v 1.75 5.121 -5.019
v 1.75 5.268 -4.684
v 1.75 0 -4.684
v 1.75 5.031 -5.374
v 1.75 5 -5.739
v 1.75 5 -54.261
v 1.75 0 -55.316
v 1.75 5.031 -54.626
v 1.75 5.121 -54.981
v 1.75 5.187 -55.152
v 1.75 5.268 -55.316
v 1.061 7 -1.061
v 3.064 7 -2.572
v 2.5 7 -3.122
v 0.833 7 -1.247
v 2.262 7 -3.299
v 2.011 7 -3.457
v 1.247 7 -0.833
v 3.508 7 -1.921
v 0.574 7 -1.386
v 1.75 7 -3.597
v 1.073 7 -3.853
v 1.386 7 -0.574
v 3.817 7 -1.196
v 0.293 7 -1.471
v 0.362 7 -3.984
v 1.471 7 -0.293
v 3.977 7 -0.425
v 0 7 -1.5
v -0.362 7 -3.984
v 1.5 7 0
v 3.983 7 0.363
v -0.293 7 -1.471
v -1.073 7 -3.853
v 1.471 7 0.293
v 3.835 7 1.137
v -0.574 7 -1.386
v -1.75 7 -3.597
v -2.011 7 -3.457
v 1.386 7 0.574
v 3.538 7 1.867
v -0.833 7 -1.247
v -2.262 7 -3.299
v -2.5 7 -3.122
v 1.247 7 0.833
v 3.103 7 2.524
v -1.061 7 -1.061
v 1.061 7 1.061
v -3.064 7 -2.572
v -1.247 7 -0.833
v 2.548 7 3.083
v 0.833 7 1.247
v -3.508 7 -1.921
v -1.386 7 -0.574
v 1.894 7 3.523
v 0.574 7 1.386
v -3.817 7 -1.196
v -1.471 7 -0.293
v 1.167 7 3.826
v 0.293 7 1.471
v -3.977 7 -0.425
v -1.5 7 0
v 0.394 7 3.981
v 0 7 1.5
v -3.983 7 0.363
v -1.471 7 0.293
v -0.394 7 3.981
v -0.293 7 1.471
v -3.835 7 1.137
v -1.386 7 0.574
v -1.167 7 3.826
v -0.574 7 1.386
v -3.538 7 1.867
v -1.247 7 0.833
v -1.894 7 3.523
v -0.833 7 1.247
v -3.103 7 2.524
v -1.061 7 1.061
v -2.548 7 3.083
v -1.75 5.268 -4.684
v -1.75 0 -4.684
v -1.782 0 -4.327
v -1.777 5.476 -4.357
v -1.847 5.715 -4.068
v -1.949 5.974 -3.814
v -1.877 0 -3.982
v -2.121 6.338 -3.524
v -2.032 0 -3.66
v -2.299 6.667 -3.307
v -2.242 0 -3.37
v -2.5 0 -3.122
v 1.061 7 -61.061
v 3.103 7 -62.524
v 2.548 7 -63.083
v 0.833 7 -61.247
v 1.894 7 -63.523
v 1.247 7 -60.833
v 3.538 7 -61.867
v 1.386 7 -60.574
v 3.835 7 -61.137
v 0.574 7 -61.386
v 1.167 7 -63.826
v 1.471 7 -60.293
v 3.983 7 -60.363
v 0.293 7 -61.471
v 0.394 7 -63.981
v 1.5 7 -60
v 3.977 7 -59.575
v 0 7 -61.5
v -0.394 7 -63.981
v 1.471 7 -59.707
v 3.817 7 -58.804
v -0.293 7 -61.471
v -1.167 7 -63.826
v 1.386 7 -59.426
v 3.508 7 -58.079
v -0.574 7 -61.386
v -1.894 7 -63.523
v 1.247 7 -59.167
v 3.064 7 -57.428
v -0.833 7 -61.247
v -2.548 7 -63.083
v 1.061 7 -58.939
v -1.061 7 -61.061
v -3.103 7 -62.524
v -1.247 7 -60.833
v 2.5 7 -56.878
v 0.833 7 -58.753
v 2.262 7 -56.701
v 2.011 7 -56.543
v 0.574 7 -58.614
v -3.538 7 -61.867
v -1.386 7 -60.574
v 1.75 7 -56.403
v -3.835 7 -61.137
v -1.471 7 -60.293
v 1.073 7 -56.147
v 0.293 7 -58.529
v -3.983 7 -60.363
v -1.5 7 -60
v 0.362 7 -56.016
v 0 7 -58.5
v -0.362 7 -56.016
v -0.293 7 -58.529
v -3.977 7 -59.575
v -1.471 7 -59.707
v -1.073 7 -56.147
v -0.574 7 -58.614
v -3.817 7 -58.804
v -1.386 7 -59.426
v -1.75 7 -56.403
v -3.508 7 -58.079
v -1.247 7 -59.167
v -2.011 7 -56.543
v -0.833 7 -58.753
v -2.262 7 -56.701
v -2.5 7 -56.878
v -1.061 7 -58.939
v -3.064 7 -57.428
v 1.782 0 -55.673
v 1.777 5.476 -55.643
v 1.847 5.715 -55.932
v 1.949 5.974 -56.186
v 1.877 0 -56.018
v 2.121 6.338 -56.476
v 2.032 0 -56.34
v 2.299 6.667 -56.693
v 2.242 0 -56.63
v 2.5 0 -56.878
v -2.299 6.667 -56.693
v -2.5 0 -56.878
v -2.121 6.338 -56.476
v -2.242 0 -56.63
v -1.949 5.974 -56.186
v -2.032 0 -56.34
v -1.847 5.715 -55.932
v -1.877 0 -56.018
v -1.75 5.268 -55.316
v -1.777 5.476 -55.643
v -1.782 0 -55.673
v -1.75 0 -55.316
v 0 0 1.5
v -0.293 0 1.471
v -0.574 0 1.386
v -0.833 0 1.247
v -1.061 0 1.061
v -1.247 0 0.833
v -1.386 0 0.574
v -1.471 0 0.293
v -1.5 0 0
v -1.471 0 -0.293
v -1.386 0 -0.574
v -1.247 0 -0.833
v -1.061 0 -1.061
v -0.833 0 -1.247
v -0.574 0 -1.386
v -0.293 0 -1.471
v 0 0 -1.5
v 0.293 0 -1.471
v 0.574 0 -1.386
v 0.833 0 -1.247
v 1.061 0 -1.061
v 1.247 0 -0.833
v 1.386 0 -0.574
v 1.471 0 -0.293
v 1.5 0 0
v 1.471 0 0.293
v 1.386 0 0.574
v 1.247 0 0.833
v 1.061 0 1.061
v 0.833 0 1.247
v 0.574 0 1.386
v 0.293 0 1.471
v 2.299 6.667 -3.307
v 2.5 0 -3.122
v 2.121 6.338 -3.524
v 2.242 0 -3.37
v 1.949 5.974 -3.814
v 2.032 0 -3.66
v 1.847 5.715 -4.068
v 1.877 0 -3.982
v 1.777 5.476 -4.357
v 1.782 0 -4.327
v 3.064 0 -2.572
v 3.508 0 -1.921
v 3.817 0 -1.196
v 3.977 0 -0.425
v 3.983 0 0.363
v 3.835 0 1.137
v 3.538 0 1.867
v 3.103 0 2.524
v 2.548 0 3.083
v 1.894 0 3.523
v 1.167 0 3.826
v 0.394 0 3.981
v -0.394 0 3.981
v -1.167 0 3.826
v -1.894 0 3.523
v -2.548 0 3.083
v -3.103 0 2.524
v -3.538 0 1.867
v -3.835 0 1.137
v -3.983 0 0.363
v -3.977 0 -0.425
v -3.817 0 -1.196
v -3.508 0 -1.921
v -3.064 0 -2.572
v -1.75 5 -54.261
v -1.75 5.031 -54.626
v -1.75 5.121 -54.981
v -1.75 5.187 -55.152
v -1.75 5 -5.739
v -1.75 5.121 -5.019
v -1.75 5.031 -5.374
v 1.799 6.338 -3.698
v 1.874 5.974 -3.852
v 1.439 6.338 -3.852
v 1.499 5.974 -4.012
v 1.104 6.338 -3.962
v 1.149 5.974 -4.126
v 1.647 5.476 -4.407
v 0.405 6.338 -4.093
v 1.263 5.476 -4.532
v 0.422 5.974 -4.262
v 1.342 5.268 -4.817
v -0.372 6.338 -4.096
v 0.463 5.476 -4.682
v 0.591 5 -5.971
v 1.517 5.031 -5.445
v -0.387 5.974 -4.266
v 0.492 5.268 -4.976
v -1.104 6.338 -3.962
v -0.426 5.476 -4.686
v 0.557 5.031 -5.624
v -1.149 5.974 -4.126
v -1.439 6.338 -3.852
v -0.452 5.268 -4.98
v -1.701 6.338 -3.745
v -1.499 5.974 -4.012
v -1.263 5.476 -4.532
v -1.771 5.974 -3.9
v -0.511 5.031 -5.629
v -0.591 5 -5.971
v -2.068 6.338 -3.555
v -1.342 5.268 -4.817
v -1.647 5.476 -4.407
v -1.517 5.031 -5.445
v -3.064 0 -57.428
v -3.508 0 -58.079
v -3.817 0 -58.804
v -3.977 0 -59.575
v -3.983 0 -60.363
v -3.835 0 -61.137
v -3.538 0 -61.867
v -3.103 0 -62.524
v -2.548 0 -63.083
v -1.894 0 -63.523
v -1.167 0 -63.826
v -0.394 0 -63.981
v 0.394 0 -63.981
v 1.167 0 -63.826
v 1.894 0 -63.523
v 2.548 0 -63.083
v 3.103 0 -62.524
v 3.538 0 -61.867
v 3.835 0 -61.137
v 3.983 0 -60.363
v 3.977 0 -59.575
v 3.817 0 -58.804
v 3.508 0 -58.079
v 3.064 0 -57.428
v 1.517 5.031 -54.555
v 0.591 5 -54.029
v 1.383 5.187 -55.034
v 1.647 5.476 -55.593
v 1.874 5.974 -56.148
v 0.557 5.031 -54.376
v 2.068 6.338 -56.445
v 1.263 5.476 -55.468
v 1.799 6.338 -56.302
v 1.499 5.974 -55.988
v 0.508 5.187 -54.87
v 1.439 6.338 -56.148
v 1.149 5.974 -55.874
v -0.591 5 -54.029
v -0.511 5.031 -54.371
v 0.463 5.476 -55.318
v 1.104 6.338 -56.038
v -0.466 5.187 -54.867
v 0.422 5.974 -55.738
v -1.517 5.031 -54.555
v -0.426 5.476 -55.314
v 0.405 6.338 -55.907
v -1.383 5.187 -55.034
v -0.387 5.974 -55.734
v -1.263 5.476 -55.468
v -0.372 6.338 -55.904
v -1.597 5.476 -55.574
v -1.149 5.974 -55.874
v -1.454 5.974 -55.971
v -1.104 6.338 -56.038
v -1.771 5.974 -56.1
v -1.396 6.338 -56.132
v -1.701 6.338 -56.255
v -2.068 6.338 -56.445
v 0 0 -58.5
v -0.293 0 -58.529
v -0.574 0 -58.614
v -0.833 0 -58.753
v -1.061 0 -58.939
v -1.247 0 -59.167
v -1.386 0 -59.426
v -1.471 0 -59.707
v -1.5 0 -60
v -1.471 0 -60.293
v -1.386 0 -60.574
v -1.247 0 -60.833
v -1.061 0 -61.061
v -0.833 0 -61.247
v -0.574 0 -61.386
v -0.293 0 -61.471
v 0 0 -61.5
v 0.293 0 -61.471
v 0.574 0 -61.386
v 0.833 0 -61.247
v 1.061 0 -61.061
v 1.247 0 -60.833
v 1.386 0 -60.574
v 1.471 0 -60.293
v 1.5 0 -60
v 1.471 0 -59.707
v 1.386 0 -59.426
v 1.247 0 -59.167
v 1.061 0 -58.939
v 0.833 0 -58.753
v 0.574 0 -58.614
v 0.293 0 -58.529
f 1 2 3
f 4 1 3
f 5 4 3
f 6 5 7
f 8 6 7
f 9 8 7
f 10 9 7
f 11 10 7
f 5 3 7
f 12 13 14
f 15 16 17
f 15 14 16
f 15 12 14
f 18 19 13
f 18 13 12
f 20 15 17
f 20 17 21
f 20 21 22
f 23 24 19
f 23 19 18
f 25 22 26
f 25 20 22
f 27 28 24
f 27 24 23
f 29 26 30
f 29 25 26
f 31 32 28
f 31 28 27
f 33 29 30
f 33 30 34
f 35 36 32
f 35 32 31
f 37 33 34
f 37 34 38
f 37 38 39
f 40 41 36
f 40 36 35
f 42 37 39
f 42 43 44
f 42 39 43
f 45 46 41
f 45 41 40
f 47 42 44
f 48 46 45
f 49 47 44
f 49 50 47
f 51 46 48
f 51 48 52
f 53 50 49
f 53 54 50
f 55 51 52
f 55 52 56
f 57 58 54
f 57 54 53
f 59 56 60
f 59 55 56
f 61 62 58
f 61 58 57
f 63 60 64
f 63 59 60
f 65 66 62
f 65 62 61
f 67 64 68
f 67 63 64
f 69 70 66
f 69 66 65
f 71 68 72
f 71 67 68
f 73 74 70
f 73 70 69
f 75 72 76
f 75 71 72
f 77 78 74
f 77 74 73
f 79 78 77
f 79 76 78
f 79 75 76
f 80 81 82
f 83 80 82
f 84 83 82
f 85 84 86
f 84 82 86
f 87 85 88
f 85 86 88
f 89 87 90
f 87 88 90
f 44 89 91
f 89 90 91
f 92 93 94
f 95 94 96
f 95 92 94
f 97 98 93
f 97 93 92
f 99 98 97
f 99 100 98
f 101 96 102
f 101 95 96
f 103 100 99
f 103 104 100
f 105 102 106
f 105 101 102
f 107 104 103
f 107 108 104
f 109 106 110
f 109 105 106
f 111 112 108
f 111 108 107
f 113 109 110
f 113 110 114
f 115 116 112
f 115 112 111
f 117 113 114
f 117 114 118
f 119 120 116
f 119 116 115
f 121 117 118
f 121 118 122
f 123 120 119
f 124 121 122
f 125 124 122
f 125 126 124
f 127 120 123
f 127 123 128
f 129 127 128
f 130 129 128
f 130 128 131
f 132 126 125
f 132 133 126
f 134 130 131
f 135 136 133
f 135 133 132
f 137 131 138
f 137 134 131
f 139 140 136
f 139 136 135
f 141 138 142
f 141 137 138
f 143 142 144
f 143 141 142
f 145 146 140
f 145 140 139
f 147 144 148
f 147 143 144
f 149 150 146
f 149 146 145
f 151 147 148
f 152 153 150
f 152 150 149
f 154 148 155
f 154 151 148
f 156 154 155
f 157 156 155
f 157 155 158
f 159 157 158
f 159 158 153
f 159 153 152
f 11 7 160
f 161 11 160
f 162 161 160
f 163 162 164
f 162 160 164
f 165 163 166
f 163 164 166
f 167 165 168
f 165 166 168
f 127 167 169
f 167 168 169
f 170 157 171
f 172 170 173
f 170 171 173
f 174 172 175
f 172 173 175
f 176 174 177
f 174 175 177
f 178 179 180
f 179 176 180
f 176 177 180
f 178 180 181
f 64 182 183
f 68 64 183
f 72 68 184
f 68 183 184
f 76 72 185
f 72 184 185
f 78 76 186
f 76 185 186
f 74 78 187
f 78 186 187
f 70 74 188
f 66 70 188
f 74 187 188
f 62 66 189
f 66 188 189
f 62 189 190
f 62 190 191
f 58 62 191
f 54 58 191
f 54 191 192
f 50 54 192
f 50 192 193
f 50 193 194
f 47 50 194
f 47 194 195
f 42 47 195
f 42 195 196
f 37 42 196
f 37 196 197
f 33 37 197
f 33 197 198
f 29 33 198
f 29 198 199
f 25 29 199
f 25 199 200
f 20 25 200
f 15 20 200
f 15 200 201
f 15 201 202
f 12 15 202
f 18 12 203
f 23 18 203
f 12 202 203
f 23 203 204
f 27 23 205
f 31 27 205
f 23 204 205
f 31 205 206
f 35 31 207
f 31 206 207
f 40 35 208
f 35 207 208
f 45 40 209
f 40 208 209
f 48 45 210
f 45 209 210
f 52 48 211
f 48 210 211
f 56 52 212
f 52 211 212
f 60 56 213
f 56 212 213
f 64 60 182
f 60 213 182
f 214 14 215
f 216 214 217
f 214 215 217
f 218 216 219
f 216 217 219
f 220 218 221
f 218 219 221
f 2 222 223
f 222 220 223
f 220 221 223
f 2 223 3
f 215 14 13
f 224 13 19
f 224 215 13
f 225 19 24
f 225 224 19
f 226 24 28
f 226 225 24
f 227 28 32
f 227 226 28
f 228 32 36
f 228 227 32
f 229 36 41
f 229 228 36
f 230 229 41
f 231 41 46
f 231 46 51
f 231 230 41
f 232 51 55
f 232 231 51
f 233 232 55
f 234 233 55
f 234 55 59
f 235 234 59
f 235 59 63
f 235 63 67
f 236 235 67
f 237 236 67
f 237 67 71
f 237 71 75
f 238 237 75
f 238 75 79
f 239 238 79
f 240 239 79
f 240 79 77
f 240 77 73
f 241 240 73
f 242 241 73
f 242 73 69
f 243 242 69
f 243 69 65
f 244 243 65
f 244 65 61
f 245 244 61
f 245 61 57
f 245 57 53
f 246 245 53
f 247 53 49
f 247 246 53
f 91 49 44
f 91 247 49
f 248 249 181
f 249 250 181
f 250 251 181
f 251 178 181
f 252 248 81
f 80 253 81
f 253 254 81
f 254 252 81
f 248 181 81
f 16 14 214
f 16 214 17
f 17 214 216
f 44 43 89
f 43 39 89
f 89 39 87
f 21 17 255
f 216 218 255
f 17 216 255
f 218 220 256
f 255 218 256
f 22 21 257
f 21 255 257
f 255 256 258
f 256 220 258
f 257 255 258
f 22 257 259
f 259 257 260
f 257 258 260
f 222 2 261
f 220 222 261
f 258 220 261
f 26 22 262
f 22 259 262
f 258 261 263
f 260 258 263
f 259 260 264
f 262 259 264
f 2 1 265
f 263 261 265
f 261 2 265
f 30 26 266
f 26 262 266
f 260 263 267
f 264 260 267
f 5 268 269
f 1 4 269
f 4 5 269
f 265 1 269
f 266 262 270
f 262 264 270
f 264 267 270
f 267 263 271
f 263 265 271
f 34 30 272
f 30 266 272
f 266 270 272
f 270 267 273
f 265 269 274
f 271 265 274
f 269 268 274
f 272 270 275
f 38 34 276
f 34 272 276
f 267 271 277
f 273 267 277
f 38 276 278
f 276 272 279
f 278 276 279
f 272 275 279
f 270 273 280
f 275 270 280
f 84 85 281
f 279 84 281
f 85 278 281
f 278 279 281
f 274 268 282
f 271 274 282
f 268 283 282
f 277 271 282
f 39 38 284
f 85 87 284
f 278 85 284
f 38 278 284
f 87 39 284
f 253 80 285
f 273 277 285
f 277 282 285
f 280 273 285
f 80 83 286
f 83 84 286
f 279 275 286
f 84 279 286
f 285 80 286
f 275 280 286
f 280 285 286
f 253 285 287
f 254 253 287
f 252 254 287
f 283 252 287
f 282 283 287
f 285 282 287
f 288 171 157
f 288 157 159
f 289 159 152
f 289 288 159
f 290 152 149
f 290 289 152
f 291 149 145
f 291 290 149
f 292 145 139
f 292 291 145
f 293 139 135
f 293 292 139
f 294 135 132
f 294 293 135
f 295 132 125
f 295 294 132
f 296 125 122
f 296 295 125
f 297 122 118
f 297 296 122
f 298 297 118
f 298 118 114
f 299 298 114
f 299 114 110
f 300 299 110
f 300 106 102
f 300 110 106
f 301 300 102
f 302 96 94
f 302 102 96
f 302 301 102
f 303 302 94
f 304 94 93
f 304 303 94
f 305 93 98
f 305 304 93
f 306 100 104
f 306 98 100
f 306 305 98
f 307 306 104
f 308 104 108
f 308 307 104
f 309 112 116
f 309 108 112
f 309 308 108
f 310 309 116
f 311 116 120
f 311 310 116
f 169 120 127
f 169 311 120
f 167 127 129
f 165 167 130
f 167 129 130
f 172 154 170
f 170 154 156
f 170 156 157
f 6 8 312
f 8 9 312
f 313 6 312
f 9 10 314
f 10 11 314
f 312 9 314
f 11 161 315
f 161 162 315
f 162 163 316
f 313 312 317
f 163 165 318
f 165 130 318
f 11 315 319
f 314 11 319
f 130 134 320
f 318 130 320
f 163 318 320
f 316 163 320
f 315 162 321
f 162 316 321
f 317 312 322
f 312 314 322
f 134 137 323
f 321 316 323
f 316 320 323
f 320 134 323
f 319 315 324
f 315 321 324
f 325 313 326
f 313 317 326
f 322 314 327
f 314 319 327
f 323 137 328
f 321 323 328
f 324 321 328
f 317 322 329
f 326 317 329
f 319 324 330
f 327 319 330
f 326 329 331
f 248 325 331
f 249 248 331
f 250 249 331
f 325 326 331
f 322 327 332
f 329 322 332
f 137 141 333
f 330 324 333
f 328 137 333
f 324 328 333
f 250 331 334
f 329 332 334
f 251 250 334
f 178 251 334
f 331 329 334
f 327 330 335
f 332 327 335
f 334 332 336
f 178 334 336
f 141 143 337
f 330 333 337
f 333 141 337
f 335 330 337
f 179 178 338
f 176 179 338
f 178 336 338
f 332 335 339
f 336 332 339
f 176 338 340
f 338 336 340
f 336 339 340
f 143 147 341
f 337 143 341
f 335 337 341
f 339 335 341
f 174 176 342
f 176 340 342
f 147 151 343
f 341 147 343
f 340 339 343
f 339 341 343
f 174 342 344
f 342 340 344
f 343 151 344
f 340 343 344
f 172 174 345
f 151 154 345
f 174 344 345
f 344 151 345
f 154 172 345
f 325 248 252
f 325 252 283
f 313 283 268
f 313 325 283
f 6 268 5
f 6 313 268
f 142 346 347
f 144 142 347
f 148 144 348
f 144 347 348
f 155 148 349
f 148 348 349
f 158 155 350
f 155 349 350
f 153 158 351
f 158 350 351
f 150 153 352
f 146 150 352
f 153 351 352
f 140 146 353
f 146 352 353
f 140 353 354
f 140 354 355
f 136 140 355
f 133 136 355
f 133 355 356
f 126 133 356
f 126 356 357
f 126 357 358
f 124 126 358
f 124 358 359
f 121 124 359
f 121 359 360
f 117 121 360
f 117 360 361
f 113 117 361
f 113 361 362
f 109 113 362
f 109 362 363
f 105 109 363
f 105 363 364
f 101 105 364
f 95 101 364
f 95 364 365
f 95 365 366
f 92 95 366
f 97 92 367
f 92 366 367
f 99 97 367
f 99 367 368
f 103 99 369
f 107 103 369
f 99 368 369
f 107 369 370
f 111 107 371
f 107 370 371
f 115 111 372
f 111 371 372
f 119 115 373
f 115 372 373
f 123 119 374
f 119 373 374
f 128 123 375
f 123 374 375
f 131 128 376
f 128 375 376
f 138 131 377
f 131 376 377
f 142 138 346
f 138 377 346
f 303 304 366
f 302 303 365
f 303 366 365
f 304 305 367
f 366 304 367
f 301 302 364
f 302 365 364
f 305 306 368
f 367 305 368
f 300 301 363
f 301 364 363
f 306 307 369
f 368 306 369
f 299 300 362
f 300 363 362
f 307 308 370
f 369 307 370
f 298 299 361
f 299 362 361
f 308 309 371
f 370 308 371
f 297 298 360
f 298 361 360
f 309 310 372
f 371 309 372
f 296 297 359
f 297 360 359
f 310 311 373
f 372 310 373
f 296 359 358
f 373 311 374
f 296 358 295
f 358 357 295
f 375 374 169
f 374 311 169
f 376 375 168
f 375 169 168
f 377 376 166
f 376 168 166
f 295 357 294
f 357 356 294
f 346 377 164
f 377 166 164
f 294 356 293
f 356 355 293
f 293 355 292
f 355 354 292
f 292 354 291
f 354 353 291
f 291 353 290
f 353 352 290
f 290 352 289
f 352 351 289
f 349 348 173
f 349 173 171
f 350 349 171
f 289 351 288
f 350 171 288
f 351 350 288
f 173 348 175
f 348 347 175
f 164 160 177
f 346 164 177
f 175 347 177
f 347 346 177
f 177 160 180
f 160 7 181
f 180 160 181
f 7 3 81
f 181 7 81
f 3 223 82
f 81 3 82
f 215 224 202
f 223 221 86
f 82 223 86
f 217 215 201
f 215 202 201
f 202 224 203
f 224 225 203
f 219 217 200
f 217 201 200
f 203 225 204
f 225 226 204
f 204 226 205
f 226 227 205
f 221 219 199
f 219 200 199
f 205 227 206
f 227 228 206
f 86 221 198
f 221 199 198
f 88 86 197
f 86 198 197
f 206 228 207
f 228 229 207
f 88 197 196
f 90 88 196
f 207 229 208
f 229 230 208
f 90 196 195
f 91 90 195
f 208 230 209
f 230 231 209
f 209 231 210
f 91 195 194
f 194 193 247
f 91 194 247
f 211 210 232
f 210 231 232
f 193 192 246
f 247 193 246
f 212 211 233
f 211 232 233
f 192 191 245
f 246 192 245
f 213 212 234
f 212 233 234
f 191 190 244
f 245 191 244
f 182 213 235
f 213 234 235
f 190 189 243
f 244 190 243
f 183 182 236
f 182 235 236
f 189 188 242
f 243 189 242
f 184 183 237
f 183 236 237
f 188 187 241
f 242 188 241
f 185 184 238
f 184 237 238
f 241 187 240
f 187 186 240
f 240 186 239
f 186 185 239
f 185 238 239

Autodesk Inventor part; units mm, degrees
ref_plane "YZ Plane" through (0, 0, 0) normal (1, 0, 0) x (0, 1, 0)
ref_plane "XZ Plane" through (0, 0, 0) normal (0, 1, 0) x (-1, 0, 0)
ref_plane "XY Plane" through (0, 0, 0) normal (0, 0, 1) x (1, 0, 0)
sketch "Sketch1" plane through (0, 0, 0) normal (0, 1, 0) x (-1, 0, 0)
  circle A0 centre (0, 0) radius 4
  line L0 (0, 0) -> (0, -60)
  circle A1 centre (0, -60) radius 4
  line L1 (0, 0) -> (0, -60) construction
  line L2 (-1.75, 0) -> (-1.75, -60)
  line L3 (1.75, -60) -> (1.75, 0)
  arc A2 (1.75, 0) -> (-1.75, 0) centre (0, 0) ccw
  arc A3 (-1.75, -60) -> (1.75, -60) centre (0, -60) ccw
  point P0 (0, -30)
  point P1 (-1.75, -3.5969)
  point P2 (-1.75, -56.4031)
  point P3 (1.75, -56.4031)
  point P4 (1.75, -3.5969)
  dimension "d0" = 8
  dimension "d1" = 60
  dimension "d2" = 8
  dimension "d3" = 3.5
extrude "Extrusion1" add sketch "Sketch1" along normal blind 7
sketch "Sketch2" plane through (0, 7, 0) normal (0, 1, 0) x (1, 0, 0)
  line L0 (1.75, 3.5969) -> (1.75, 56.4031) projected
  arc A0 (1.75, 56.4031) -> (-1.75, 56.4031) centre (0, 60) ccw projected
  line L1 (-1.75, 56.4031) -> (-1.75, 3.5969) projected
  arc A1 (-1.75, 3.5969) -> (1.75, 3.5969) centre (0, 0) ccw projected
  circle A2 centre (0, 0) radius 4
  circle A3 centre (0, 60) radius 4
  point P0 (-1.75, 56.4031)
  point P1 (-1.75, 3.5969)
  dimension "d6" = 8
  dimension "d7" = 8
extrude "Extrusion2" cut sketch "Sketch2" against normal blind 2 contours A2 L1 A3 L0
sketch "Sketch3" plane through (0, 7, 0) normal (0, 1, 0) x (1, 0, 0)
  circle A0 centre (0, 0) radius 4 projected
  circle A1 centre (0, 60) radius 4 projected
hole "Hole1" at (0, 7, 0) at (0, 7, -60) direction (0, -1, 0) diameter 3 depth 8
fillet "Fillet1" radius 2 6 edges at (1.75, 2.5, -56.4031) (0, 5, -56) (-1.75, 2.5, -56.4031) (-1.75, 2.5, -3.5969) (0, 5, -4) (1.75, 2.5, -3.5969)
properties part number "leg_link_3_m"
